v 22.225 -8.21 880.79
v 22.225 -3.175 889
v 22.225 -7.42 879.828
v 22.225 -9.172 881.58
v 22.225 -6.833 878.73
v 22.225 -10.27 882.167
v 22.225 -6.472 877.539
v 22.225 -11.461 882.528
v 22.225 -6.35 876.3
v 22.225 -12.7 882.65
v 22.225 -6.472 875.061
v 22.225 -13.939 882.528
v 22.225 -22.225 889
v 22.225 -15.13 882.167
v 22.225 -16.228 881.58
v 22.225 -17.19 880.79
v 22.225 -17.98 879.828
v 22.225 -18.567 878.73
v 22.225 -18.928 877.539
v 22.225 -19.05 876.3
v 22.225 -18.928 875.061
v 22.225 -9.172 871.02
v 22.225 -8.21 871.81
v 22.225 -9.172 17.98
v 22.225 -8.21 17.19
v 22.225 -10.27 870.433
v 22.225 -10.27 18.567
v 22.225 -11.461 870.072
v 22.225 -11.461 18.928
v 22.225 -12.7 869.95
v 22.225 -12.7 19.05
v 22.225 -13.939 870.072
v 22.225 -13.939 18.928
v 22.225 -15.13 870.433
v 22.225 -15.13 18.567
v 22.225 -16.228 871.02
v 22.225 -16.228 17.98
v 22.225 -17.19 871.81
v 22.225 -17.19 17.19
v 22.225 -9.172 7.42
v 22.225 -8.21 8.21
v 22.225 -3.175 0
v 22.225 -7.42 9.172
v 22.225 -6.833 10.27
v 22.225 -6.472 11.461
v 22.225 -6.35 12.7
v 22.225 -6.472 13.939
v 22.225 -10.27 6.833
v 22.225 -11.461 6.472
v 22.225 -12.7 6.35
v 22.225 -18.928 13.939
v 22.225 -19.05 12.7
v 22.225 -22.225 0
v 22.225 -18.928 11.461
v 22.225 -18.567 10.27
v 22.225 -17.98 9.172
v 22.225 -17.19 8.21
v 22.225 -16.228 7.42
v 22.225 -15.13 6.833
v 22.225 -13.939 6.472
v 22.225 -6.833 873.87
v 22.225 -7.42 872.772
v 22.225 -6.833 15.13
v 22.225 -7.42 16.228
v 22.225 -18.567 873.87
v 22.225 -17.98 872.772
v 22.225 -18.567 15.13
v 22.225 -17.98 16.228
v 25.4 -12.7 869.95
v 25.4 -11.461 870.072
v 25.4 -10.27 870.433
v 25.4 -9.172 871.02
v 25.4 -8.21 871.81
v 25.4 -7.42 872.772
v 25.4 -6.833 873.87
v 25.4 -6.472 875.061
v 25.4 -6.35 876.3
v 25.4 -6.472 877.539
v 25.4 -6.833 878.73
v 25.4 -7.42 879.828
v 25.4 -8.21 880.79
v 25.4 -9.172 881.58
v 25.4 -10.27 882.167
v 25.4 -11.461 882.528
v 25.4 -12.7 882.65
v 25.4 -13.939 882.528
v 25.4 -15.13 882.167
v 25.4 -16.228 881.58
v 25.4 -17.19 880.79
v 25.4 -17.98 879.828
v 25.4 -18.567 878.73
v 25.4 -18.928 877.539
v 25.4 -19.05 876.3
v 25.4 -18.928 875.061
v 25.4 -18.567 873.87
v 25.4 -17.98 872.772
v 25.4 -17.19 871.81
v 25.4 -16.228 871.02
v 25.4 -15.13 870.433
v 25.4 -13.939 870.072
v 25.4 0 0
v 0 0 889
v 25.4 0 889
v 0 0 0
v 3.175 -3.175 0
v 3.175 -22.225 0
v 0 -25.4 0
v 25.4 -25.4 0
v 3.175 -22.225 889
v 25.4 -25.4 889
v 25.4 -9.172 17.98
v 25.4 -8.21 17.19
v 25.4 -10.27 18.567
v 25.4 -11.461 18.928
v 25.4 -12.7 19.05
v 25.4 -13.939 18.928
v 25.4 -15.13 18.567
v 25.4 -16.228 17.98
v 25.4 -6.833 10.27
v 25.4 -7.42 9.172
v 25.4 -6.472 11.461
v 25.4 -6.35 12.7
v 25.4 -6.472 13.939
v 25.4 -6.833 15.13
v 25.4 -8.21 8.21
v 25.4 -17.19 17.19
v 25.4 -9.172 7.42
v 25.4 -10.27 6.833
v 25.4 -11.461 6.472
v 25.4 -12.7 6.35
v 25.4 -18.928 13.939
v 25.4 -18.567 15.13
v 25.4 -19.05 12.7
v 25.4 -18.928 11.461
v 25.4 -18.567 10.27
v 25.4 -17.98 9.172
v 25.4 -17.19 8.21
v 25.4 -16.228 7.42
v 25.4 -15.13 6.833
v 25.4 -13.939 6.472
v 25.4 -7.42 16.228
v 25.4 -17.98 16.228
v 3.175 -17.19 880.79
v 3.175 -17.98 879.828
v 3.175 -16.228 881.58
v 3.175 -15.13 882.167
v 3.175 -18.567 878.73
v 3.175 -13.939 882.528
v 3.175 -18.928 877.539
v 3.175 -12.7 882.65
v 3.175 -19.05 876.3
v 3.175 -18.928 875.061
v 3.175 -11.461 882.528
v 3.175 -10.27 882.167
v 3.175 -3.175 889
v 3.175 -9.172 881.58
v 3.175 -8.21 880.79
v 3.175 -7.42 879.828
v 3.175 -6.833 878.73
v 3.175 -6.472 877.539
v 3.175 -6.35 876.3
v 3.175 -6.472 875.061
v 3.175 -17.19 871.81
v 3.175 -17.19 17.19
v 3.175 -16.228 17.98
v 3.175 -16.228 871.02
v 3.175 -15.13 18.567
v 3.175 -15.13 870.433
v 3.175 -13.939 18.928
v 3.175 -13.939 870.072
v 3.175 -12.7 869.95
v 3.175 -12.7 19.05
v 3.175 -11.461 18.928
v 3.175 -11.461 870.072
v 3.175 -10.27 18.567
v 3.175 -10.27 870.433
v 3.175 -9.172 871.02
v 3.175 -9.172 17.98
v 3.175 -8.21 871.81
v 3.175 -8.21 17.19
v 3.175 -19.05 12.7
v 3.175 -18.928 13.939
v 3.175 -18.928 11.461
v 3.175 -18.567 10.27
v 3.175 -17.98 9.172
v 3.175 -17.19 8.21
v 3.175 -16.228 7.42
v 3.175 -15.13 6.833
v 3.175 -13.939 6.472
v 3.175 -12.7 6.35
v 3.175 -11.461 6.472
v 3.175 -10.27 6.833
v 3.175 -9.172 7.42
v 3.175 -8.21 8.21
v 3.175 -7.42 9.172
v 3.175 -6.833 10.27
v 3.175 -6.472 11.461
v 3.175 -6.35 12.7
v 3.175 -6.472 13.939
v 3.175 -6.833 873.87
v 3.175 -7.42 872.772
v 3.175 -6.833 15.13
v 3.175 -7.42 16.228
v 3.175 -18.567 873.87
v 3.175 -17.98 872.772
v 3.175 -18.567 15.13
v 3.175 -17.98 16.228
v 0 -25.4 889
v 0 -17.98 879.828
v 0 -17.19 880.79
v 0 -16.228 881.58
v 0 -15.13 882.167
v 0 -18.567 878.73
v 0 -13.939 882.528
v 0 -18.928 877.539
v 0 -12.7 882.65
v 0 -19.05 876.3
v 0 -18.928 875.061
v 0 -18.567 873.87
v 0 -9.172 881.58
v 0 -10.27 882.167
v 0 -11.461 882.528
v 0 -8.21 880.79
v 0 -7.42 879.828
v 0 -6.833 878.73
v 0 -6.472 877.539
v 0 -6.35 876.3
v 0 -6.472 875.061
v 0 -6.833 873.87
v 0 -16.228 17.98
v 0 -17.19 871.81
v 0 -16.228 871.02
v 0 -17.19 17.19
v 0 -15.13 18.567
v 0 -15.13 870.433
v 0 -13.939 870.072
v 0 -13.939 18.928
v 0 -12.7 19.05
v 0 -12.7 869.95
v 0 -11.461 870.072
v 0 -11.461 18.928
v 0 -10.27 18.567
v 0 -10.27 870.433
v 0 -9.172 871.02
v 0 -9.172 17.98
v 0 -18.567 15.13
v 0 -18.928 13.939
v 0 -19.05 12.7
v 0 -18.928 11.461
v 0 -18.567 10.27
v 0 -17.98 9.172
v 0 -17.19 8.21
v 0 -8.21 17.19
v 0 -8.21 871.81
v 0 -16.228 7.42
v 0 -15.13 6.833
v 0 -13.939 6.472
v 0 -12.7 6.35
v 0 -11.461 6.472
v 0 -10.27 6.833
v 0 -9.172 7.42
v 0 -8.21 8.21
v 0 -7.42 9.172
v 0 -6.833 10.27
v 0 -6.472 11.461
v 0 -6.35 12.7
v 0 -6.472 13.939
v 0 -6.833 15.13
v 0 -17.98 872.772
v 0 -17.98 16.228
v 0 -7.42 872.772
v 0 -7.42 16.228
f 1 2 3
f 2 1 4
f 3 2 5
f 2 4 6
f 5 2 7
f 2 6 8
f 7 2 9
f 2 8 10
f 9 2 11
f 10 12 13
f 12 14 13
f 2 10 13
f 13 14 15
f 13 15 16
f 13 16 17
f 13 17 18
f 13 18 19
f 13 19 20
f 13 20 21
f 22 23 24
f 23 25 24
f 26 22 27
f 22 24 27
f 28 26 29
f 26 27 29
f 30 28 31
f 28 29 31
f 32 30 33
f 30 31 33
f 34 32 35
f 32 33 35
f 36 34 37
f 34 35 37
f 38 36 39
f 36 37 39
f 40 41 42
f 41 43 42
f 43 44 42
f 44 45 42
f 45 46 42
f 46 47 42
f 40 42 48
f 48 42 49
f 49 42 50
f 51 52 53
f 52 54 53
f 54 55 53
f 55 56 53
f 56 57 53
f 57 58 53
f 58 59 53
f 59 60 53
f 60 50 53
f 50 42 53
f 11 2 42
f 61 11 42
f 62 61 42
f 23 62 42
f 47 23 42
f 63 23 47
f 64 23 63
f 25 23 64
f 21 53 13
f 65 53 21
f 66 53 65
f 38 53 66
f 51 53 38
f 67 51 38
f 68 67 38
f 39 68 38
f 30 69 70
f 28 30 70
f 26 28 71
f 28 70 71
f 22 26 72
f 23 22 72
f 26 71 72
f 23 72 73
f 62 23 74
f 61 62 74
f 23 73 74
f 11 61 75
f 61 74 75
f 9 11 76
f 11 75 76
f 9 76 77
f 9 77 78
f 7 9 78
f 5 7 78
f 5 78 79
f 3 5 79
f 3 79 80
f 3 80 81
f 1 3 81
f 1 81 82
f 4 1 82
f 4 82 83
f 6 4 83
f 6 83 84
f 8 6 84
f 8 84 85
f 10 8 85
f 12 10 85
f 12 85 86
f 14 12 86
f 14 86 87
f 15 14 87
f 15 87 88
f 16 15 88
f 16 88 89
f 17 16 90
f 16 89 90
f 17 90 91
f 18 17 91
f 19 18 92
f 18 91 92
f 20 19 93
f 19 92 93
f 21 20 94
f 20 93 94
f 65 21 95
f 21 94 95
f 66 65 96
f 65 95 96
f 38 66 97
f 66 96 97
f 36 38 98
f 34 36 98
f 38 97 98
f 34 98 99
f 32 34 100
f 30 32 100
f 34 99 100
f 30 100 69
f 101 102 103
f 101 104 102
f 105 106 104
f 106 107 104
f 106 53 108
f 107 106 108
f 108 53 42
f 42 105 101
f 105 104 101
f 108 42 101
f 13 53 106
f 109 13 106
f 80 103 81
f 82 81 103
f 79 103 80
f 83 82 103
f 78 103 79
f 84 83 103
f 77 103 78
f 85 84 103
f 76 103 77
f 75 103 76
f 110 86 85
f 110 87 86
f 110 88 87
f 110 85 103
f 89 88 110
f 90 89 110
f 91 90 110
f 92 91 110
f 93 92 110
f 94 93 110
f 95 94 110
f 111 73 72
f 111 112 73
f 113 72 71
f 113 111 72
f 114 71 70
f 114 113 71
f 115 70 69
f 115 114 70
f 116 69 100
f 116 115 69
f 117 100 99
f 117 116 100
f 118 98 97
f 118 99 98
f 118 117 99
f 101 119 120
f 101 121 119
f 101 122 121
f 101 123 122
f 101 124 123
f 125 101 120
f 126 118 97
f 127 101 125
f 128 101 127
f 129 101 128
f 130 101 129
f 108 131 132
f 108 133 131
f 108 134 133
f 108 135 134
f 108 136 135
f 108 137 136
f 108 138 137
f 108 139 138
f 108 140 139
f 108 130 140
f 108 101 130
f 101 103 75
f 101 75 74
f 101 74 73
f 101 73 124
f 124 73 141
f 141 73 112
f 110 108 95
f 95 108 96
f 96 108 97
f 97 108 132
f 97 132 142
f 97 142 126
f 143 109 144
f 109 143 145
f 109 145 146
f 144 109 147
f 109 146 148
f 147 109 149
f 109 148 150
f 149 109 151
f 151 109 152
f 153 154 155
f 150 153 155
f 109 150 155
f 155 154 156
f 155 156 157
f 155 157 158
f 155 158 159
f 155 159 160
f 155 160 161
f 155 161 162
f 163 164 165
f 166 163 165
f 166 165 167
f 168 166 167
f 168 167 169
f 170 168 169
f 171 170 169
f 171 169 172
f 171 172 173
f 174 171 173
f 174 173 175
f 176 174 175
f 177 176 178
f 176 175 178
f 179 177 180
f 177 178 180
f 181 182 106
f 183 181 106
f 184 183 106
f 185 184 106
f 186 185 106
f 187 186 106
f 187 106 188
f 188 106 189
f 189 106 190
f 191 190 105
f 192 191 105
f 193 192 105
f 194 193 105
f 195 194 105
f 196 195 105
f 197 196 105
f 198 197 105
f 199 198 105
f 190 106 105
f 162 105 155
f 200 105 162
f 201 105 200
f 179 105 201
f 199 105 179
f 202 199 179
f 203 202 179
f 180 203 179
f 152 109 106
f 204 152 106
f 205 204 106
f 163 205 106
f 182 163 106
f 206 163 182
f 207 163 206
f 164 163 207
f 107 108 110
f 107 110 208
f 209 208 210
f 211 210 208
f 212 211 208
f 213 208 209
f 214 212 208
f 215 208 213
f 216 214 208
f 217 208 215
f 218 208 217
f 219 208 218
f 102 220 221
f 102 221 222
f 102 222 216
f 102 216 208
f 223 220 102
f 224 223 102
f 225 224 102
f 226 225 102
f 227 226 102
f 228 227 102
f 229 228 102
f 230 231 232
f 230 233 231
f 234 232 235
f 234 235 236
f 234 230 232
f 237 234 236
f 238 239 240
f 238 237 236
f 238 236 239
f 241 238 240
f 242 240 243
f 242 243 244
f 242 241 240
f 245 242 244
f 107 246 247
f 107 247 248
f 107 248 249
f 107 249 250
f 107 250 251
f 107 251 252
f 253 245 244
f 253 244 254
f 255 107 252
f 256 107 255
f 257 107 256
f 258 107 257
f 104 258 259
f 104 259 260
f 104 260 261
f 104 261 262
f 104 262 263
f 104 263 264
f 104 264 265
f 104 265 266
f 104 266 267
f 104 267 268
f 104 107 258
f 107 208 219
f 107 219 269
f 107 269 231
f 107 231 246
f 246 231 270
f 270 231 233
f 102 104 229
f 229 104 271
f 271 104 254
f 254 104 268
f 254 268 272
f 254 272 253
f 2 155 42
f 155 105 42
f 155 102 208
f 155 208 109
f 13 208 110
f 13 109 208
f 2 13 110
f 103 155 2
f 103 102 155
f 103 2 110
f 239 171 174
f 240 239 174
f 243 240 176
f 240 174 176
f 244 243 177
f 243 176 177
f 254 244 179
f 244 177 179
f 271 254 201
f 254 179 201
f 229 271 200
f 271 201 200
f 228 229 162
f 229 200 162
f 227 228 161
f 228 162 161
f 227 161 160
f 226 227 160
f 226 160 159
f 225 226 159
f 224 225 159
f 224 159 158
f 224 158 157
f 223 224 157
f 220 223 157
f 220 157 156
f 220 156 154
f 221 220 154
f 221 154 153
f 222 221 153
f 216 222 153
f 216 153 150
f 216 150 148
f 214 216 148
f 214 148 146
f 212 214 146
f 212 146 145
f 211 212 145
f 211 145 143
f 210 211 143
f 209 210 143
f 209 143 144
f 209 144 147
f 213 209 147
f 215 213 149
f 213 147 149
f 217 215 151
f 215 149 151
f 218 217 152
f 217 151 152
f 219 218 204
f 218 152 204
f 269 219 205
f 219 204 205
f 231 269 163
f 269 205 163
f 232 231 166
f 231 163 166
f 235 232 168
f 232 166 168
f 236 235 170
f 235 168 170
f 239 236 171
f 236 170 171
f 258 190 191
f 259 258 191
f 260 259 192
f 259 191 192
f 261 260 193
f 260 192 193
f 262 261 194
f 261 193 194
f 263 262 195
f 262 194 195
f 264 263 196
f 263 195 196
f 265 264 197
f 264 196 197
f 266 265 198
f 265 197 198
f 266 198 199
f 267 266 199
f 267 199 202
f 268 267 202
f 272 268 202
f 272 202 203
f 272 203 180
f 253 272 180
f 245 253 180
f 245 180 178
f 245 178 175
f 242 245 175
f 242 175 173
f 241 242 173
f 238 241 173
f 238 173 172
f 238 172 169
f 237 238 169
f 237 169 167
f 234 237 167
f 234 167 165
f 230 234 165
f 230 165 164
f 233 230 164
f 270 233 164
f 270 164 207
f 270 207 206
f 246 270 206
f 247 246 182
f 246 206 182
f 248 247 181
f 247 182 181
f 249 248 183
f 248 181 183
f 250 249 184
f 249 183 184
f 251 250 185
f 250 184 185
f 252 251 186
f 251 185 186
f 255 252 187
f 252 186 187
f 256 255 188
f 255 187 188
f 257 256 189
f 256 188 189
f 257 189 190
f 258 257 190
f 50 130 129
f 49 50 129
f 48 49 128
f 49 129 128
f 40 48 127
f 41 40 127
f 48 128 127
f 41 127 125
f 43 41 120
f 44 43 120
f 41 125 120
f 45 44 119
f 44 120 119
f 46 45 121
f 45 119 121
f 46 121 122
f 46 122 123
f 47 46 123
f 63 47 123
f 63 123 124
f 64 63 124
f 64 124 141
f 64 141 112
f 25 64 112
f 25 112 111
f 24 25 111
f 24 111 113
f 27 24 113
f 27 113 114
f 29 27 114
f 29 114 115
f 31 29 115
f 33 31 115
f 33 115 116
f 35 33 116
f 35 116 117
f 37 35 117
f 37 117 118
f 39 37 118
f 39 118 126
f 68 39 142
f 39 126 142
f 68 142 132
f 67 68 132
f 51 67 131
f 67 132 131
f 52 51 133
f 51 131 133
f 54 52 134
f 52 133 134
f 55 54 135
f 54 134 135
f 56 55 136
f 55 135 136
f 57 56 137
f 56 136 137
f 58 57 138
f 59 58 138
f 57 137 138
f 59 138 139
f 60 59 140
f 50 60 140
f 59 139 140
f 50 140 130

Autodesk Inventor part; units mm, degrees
ref_plane "YZ Plane" through (0, 0, 0) normal (1, 0, 0) x (0, 1, 0)
ref_plane "XZ Plane" through (0, 0, 0) normal (0, 1, 0) x (-1, 0, 0)
ref_plane "XY Plane" through (0, 0, 0) normal (0, 0, 1) x (1, 0, 0)
sketch "Sketch1" plane through (0, 0, 0) normal (0, 0, 1) x (1, 0, 0)
  line L0 (0, 0) -> (25.4, 0)
  line L1 (25.4, 0) -> (25.4, -25.4)
  line L2 (25.4, -25.4) -> (0, -25.4)
  line L3 (0, -25.4) -> (0, 0)
  dimension "d0" = 25.4
  dimension "d1" = 25.4
extrude "Extrusion1" add sketch "Sketch1" along normal blind 889
shell "Shell1" thickness 3.175 removed faces 2 at (8.4667, -8.4667, 0) at (8.4667, -8.4667, 889)
sketch "Sketch2" plane through (25.4, -25.4, 0) normal (1, 0, 0) x (0, 0, -1)
  circle A0 centre (-12.7, 12.7) radius 6.35
  line L0 (0, 25.4) -> (-889, 25.4) projected
  line L1 (0, 25.4) -> (0, 0) projected
  circle A1 centre (-876.3, 12.7) radius 6.35
  line L2 (-889, 0) -> (-889, 25.4) projected
  dimension "d5" = 12.7
  dimension "d6" = 12.7
  dimension "d7" = 12.7
  dimension "d10" = 12.7
  dimension "d11" = 12.7
  dimension "d12" = 12.7
extrude "Extrusion2" cut sketch "Sketch2" against normal blind 889
properties part number "Kermit Frame 16"
